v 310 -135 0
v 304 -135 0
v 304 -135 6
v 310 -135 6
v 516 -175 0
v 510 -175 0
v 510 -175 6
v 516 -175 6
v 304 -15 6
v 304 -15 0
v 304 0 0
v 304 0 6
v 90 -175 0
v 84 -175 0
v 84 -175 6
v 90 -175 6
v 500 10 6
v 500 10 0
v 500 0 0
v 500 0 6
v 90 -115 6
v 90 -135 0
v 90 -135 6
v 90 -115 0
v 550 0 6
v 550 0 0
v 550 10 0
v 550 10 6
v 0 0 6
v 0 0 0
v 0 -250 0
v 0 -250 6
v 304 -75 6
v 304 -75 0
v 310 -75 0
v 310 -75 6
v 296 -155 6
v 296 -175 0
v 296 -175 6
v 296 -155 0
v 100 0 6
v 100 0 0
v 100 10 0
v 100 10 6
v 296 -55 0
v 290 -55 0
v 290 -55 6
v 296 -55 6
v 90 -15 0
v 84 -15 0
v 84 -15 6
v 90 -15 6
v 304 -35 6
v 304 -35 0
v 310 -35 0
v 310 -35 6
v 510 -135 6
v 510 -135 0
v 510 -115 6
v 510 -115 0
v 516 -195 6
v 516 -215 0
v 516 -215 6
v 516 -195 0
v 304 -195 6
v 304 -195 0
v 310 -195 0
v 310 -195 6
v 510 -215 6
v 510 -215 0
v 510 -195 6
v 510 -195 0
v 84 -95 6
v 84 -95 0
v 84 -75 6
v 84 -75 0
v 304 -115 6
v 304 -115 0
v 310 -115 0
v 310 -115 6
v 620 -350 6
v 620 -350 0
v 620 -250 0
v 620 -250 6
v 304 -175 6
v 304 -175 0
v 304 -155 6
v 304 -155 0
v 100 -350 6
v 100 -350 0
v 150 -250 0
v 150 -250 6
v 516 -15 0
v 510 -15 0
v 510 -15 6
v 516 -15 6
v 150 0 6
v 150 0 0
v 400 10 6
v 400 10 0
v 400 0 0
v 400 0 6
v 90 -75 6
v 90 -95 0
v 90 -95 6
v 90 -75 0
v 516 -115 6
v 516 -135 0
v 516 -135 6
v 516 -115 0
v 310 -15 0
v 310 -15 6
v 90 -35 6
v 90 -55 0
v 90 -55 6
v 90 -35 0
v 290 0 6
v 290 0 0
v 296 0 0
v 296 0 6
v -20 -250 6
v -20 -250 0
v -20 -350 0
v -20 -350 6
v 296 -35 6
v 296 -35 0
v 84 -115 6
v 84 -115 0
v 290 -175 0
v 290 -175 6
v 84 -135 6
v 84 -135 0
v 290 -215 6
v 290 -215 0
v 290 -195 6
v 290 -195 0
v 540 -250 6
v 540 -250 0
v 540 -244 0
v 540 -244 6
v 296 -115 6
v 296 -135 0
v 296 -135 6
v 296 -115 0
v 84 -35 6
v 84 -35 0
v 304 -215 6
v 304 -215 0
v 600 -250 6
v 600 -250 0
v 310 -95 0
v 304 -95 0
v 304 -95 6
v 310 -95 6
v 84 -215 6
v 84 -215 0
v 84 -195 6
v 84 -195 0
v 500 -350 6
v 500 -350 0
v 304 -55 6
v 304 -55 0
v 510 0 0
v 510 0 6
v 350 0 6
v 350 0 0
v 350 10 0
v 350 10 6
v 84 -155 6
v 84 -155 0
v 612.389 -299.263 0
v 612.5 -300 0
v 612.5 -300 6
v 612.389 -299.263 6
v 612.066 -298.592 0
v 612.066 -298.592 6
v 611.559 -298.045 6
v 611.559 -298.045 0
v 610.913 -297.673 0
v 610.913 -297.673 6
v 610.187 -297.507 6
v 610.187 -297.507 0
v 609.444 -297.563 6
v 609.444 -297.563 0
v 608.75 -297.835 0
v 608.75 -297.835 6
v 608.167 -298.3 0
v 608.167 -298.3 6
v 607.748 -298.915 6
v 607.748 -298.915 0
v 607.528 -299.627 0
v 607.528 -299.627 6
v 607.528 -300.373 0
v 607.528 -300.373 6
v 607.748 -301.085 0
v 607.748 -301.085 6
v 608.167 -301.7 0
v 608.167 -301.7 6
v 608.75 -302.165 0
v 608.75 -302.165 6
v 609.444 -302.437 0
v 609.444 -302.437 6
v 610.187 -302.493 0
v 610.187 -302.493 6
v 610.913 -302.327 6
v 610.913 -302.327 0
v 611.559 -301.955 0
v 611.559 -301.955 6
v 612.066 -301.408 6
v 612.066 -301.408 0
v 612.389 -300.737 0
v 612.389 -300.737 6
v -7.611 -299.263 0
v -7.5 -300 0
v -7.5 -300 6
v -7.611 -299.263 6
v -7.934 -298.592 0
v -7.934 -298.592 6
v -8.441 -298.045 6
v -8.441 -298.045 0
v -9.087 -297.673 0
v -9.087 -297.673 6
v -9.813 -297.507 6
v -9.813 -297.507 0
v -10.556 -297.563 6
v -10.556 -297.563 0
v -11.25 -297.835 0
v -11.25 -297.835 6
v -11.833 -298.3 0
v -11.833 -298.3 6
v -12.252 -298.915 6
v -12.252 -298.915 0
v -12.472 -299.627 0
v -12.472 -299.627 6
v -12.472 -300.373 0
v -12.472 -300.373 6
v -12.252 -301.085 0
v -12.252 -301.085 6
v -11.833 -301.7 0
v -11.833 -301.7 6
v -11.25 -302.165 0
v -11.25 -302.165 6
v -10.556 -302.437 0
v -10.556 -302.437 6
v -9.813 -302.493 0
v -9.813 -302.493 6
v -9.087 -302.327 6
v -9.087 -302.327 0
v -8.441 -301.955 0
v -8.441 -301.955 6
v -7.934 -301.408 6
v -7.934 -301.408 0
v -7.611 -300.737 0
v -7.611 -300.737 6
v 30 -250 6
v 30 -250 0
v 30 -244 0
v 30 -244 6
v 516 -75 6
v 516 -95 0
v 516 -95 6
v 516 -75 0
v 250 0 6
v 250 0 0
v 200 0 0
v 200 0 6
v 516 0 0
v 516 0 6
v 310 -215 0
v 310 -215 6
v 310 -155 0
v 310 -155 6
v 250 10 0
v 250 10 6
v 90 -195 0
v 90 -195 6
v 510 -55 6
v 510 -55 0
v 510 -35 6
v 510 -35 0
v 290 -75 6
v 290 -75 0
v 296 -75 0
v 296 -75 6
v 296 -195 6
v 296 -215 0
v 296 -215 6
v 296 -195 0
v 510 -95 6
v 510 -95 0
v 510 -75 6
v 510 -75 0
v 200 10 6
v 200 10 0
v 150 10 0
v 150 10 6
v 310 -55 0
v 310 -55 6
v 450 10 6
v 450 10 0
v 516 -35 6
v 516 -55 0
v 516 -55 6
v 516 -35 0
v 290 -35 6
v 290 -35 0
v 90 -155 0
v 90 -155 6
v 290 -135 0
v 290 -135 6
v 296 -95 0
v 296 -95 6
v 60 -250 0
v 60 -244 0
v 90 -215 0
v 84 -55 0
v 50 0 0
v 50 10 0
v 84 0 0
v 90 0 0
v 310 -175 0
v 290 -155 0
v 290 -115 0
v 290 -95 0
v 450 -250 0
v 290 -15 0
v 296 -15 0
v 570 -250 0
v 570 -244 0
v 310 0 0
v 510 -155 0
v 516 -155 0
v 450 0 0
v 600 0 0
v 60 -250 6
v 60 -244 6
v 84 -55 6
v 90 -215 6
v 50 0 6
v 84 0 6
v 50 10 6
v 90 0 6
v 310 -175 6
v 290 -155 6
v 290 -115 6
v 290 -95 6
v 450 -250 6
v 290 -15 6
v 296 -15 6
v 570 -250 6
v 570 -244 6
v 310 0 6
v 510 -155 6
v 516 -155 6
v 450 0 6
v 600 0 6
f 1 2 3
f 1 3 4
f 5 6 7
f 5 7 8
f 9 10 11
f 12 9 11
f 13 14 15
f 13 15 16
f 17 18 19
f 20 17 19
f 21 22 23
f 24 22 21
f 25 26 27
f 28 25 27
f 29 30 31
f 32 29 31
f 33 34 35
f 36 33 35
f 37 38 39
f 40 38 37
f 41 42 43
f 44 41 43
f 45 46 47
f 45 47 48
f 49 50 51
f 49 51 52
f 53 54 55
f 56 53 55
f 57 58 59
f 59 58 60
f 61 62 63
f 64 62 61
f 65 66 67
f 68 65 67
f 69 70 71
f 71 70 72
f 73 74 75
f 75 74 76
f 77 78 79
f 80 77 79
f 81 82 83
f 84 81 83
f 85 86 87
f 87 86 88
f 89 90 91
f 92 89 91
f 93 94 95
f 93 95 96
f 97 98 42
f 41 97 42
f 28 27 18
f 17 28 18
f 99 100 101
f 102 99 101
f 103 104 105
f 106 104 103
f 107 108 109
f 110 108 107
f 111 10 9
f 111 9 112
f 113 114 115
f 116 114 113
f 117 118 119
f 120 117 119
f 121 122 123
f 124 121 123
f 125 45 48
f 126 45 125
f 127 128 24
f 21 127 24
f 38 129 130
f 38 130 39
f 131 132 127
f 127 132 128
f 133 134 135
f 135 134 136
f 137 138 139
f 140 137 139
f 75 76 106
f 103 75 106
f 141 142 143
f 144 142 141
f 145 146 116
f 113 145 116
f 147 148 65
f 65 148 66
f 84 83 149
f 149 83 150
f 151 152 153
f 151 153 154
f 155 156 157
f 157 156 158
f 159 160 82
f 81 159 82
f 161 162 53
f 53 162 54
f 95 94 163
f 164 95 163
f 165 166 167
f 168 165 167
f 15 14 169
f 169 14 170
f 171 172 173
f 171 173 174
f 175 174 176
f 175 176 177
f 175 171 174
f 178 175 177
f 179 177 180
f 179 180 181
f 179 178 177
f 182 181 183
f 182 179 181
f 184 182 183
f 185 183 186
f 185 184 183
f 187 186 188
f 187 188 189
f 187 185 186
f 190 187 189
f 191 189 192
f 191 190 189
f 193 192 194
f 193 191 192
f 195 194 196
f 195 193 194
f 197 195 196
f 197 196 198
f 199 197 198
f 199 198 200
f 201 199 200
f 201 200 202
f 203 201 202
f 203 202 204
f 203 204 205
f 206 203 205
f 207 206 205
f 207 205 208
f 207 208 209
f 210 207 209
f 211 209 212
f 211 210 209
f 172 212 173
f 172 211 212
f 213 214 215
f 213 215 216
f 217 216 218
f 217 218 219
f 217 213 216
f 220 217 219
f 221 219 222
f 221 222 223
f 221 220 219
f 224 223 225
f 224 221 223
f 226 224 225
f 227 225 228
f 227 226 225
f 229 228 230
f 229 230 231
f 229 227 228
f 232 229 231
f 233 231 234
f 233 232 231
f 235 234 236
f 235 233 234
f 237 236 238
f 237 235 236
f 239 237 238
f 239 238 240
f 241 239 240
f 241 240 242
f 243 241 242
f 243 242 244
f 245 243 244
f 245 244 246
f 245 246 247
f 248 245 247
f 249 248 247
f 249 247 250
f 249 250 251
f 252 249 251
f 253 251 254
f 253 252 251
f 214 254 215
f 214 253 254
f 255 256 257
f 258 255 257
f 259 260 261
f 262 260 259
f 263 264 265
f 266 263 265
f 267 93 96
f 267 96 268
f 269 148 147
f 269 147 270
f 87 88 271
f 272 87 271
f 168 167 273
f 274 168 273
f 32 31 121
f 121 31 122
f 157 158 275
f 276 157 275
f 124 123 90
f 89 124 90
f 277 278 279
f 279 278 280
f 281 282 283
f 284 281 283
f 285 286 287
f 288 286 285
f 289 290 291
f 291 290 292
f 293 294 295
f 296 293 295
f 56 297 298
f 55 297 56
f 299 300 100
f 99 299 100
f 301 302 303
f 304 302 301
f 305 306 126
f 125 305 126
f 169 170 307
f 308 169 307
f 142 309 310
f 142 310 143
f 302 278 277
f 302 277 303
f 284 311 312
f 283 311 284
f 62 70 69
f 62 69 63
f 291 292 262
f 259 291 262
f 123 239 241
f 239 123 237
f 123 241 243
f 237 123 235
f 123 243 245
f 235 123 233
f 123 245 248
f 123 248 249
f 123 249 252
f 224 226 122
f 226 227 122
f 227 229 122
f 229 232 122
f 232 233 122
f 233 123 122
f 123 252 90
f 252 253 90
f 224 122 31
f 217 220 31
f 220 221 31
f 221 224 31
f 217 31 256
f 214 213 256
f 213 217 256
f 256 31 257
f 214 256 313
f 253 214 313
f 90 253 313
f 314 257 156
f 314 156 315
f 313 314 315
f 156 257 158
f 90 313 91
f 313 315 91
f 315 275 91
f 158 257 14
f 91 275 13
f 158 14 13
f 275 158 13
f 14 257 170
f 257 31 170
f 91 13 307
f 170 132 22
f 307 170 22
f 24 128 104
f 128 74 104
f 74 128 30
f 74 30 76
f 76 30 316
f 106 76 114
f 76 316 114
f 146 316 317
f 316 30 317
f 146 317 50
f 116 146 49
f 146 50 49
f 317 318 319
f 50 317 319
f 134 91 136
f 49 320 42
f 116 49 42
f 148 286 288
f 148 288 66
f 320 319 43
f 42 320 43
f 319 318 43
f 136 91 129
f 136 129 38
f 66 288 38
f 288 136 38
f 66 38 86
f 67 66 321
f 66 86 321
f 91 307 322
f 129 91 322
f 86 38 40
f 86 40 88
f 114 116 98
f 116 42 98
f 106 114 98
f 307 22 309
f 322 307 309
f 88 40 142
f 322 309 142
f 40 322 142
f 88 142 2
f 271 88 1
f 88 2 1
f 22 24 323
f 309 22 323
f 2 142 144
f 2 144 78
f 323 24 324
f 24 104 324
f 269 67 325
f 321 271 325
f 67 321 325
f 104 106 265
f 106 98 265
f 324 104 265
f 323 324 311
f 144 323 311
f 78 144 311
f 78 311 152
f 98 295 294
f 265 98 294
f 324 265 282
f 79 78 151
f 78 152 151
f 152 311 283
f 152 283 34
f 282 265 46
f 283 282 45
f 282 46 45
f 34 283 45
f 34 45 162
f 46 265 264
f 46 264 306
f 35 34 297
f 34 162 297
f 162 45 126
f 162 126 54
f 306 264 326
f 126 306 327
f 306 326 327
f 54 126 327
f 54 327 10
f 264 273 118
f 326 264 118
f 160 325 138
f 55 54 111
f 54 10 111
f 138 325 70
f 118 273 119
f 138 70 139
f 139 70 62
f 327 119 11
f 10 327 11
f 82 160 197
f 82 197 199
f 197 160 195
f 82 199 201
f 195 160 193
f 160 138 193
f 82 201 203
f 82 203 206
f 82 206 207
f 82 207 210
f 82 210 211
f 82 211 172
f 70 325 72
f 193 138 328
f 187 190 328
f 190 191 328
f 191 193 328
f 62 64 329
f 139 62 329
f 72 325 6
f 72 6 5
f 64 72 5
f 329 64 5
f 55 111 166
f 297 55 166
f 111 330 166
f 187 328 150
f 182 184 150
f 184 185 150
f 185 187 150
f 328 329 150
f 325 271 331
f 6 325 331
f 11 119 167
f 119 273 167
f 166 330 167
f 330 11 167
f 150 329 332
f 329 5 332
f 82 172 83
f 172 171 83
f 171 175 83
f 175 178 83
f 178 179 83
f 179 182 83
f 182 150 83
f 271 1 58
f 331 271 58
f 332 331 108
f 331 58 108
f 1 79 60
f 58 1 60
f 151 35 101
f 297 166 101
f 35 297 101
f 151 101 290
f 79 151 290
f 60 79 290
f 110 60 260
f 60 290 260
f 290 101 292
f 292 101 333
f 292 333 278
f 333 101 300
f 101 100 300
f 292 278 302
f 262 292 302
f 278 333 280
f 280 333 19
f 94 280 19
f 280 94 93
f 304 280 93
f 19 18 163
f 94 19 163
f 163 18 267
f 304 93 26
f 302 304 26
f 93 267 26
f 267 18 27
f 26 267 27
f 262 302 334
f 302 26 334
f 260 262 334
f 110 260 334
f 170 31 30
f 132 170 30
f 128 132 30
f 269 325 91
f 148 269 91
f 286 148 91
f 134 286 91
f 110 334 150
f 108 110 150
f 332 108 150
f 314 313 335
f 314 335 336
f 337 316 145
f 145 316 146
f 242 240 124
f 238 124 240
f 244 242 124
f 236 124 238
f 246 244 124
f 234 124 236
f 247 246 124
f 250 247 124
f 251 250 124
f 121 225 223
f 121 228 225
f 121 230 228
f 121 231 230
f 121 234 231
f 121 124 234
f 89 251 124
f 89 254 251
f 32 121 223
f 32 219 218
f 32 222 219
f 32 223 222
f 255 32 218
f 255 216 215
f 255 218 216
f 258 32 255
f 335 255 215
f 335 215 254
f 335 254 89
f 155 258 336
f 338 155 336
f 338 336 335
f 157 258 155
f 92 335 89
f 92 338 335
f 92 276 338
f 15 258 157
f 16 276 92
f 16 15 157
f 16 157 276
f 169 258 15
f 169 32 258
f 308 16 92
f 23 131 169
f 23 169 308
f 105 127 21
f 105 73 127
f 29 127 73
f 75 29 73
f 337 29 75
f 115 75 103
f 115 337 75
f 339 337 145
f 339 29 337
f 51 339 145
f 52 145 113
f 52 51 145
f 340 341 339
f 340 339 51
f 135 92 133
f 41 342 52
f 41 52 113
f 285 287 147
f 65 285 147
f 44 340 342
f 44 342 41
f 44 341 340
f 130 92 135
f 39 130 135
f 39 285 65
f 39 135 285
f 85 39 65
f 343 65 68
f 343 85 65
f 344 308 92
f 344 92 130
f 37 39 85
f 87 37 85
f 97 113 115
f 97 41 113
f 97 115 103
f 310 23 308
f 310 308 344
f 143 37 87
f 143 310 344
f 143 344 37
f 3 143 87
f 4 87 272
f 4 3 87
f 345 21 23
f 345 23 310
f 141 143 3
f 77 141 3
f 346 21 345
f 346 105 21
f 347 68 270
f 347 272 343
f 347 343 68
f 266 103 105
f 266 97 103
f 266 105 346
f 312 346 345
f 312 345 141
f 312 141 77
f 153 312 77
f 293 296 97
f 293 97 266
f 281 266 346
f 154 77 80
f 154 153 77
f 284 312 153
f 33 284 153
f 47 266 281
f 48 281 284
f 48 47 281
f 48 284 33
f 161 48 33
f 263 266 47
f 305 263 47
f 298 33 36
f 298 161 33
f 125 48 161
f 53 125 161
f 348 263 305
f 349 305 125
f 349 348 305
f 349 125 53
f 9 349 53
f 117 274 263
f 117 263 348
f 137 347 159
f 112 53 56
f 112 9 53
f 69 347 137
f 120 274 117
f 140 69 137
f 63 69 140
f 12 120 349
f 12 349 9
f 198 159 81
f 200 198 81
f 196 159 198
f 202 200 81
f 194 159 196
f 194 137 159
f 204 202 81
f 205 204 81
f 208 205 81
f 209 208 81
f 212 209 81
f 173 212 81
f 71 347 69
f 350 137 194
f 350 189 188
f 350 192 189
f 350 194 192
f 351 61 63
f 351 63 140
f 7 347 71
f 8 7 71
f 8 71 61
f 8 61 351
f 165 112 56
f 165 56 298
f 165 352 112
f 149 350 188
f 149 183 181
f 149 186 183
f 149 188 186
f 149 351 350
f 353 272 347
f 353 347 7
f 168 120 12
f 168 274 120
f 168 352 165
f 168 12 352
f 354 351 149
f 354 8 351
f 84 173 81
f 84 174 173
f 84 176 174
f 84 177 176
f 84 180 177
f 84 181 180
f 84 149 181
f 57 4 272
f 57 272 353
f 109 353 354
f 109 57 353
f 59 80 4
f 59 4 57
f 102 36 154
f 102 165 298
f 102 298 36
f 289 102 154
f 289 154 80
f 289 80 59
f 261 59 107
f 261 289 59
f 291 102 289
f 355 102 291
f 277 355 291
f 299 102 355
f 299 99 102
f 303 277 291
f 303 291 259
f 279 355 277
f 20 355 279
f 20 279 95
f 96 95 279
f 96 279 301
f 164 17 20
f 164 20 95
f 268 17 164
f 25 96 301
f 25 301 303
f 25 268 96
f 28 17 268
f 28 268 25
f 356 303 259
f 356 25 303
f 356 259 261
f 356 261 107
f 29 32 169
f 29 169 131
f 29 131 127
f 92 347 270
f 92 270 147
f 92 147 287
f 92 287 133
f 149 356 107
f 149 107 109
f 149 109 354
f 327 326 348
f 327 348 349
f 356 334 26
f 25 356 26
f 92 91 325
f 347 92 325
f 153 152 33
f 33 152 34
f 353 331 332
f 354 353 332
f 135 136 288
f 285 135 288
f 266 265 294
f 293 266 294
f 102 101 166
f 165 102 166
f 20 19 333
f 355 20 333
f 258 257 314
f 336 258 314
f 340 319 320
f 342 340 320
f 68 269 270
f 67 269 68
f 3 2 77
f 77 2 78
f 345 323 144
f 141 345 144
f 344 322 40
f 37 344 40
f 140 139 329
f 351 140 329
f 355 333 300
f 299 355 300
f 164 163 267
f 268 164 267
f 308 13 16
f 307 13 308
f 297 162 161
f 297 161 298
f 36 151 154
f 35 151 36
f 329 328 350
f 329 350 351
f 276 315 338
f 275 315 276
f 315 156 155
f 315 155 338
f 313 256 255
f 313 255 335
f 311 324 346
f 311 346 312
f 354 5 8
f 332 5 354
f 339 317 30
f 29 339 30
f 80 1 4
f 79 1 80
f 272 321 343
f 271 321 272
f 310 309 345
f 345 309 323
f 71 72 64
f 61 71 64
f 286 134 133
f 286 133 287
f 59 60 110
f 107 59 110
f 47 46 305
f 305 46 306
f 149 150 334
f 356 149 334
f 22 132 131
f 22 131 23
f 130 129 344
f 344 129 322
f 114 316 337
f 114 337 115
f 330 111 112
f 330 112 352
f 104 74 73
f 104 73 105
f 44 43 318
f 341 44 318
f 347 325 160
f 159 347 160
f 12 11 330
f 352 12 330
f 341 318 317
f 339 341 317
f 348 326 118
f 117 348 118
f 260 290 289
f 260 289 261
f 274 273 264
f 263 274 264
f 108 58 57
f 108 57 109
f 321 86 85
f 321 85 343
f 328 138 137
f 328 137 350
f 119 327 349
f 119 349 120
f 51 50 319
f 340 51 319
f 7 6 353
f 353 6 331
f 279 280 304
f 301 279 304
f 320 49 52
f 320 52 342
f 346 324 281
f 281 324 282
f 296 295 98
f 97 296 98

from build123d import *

# Parameters (mm, degrees)
SKETCH_1_W      = 6
SKETCH_1_H      = 15
SKETCH_1_R      = 2.5
SKETCH_1_W_2    = 30
SKETCH_1_H_2    = 6
SKETCH_1_H_3    = 20
EXTRUDE_1_DEPTH = 6


with BuildPart() as part:
    # 草图1 → 凸台-拉伸1 (new body)
    with BuildSketch(Plane.XY):
        Polygon((50, 0), (0, 0), (0, -250), (-20, -250), (-20, -350), (100, -350), (150, -250), (450, -250), (500, -350), (620, -350), (620, -250), (600, -250), (600, 0), (550, 0), (550, 10), (500, 10), (500, 0), (450, 0), (450, 10), (400, 10), (400, 0), (350, 0), (350, 10), (300, 10), (250, 10), (250, 0), (200, 0), (200, 10), (150, 10), (150, 0), (100, 0), (100, 10), (50, 10), align=None)
        with Locations((513, -7.5)):
            Rectangle(SKETCH_1_W, SKETCH_1_H, mode=Mode.SUBTRACT)
        with Locations((-10, -300)):
            Circle(SKETCH_1_R, mode=Mode.SUBTRACT)
        with Locations((45, -247)):
            Rectangle(SKETCH_1_W_2, SKETCH_1_H_2, mode=Mode.SUBTRACT)
        with Locations((87, -205)):
            Rectangle(SKETCH_1_W, SKETCH_1_H_3, mode=Mode.SUBTRACT)
        with Locations((87, -165)):
            Rectangle(SKETCH_1_W, SKETCH_1_H_3, mode=Mode.SUBTRACT)
        with Locations((293, -205)):
            Rectangle(SKETCH_1_W, SKETCH_1_H_3, mode=Mode.SUBTRACT)
        with Locations((293, -165)):
            Rectangle(SKETCH_1_W, SKETCH_1_H_3, mode=Mode.SUBTRACT)
        with Locations((610, -300)):
            Circle(SKETCH_1_R, mode=Mode.SUBTRACT)
        with Locations((555, -247)):
            Rectangle(SKETCH_1_W_2, SKETCH_1_H_2, mode=Mode.SUBTRACT)
        with Locations((307, -205)):
            Rectangle(SKETCH_1_W, SKETCH_1_H_3, mode=Mode.SUBTRACT)
        with Locations((307, -165)):
            Rectangle(SKETCH_1_W, SKETCH_1_H_3, mode=Mode.SUBTRACT)
        with Locations((513, -205)):
            Rectangle(SKETCH_1_W, SKETCH_1_H_3, mode=Mode.SUBTRACT)
        with Locations((513, -165)):
            Rectangle(SKETCH_1_W, SKETCH_1_H_3, mode=Mode.SUBTRACT)
        with Locations((87, -125)):
            Rectangle(SKETCH_1_W, SKETCH_1_H_3, mode=Mode.SUBTRACT)
        with Locations((87, -85)):
            Rectangle(SKETCH_1_W, SKETCH_1_H_3, mode=Mode.SUBTRACT)
        with Locations((293, -125)):
            Rectangle(SKETCH_1_W, SKETCH_1_H_3, mode=Mode.SUBTRACT)
        with Locations((293, -85)):
            Rectangle(SKETCH_1_W, SKETCH_1_H_3, mode=Mode.SUBTRACT)
        with Locations((87, -45)):
            Rectangle(SKETCH_1_W, SKETCH_1_H_3, mode=Mode.SUBTRACT)
        with Locations((87, -7.5)):
            Rectangle(SKETCH_1_W, SKETCH_1_H, mode=Mode.SUBTRACT)
        with Locations((293, -45)):
            Rectangle(SKETCH_1_W, SKETCH_1_H_3, mode=Mode.SUBTRACT)
        with Locations((293, -7.5)):
            Rectangle(SKETCH_1_W, SKETCH_1_H, mode=Mode.SUBTRACT)
        with Locations((307, -125)):
            Rectangle(SKETCH_1_W, SKETCH_1_H_3, mode=Mode.SUBTRACT)
        with Locations((307, -85)):
            Rectangle(SKETCH_1_W, SKETCH_1_H_3, mode=Mode.SUBTRACT)
        with Locations((513, -125)):
            Rectangle(SKETCH_1_W, SKETCH_1_H_3, mode=Mode.SUBTRACT)
        with Locations((513, -85)):
            Rectangle(SKETCH_1_W, SKETCH_1_H_3, mode=Mode.SUBTRACT)
        with Locations((307, -45)):
            Rectangle(SKETCH_1_W, SKETCH_1_H_3, mode=Mode.SUBTRACT)
        with Locations((307, -7.5)):
            Rectangle(SKETCH_1_W, SKETCH_1_H, mode=Mode.SUBTRACT)
        with Locations((513, -45)):
            Rectangle(SKETCH_1_W, SKETCH_1_H_3, mode=Mode.SUBTRACT)
    extrude(amount=EXTRUDE_1_DEPTH)


solid = part.part
